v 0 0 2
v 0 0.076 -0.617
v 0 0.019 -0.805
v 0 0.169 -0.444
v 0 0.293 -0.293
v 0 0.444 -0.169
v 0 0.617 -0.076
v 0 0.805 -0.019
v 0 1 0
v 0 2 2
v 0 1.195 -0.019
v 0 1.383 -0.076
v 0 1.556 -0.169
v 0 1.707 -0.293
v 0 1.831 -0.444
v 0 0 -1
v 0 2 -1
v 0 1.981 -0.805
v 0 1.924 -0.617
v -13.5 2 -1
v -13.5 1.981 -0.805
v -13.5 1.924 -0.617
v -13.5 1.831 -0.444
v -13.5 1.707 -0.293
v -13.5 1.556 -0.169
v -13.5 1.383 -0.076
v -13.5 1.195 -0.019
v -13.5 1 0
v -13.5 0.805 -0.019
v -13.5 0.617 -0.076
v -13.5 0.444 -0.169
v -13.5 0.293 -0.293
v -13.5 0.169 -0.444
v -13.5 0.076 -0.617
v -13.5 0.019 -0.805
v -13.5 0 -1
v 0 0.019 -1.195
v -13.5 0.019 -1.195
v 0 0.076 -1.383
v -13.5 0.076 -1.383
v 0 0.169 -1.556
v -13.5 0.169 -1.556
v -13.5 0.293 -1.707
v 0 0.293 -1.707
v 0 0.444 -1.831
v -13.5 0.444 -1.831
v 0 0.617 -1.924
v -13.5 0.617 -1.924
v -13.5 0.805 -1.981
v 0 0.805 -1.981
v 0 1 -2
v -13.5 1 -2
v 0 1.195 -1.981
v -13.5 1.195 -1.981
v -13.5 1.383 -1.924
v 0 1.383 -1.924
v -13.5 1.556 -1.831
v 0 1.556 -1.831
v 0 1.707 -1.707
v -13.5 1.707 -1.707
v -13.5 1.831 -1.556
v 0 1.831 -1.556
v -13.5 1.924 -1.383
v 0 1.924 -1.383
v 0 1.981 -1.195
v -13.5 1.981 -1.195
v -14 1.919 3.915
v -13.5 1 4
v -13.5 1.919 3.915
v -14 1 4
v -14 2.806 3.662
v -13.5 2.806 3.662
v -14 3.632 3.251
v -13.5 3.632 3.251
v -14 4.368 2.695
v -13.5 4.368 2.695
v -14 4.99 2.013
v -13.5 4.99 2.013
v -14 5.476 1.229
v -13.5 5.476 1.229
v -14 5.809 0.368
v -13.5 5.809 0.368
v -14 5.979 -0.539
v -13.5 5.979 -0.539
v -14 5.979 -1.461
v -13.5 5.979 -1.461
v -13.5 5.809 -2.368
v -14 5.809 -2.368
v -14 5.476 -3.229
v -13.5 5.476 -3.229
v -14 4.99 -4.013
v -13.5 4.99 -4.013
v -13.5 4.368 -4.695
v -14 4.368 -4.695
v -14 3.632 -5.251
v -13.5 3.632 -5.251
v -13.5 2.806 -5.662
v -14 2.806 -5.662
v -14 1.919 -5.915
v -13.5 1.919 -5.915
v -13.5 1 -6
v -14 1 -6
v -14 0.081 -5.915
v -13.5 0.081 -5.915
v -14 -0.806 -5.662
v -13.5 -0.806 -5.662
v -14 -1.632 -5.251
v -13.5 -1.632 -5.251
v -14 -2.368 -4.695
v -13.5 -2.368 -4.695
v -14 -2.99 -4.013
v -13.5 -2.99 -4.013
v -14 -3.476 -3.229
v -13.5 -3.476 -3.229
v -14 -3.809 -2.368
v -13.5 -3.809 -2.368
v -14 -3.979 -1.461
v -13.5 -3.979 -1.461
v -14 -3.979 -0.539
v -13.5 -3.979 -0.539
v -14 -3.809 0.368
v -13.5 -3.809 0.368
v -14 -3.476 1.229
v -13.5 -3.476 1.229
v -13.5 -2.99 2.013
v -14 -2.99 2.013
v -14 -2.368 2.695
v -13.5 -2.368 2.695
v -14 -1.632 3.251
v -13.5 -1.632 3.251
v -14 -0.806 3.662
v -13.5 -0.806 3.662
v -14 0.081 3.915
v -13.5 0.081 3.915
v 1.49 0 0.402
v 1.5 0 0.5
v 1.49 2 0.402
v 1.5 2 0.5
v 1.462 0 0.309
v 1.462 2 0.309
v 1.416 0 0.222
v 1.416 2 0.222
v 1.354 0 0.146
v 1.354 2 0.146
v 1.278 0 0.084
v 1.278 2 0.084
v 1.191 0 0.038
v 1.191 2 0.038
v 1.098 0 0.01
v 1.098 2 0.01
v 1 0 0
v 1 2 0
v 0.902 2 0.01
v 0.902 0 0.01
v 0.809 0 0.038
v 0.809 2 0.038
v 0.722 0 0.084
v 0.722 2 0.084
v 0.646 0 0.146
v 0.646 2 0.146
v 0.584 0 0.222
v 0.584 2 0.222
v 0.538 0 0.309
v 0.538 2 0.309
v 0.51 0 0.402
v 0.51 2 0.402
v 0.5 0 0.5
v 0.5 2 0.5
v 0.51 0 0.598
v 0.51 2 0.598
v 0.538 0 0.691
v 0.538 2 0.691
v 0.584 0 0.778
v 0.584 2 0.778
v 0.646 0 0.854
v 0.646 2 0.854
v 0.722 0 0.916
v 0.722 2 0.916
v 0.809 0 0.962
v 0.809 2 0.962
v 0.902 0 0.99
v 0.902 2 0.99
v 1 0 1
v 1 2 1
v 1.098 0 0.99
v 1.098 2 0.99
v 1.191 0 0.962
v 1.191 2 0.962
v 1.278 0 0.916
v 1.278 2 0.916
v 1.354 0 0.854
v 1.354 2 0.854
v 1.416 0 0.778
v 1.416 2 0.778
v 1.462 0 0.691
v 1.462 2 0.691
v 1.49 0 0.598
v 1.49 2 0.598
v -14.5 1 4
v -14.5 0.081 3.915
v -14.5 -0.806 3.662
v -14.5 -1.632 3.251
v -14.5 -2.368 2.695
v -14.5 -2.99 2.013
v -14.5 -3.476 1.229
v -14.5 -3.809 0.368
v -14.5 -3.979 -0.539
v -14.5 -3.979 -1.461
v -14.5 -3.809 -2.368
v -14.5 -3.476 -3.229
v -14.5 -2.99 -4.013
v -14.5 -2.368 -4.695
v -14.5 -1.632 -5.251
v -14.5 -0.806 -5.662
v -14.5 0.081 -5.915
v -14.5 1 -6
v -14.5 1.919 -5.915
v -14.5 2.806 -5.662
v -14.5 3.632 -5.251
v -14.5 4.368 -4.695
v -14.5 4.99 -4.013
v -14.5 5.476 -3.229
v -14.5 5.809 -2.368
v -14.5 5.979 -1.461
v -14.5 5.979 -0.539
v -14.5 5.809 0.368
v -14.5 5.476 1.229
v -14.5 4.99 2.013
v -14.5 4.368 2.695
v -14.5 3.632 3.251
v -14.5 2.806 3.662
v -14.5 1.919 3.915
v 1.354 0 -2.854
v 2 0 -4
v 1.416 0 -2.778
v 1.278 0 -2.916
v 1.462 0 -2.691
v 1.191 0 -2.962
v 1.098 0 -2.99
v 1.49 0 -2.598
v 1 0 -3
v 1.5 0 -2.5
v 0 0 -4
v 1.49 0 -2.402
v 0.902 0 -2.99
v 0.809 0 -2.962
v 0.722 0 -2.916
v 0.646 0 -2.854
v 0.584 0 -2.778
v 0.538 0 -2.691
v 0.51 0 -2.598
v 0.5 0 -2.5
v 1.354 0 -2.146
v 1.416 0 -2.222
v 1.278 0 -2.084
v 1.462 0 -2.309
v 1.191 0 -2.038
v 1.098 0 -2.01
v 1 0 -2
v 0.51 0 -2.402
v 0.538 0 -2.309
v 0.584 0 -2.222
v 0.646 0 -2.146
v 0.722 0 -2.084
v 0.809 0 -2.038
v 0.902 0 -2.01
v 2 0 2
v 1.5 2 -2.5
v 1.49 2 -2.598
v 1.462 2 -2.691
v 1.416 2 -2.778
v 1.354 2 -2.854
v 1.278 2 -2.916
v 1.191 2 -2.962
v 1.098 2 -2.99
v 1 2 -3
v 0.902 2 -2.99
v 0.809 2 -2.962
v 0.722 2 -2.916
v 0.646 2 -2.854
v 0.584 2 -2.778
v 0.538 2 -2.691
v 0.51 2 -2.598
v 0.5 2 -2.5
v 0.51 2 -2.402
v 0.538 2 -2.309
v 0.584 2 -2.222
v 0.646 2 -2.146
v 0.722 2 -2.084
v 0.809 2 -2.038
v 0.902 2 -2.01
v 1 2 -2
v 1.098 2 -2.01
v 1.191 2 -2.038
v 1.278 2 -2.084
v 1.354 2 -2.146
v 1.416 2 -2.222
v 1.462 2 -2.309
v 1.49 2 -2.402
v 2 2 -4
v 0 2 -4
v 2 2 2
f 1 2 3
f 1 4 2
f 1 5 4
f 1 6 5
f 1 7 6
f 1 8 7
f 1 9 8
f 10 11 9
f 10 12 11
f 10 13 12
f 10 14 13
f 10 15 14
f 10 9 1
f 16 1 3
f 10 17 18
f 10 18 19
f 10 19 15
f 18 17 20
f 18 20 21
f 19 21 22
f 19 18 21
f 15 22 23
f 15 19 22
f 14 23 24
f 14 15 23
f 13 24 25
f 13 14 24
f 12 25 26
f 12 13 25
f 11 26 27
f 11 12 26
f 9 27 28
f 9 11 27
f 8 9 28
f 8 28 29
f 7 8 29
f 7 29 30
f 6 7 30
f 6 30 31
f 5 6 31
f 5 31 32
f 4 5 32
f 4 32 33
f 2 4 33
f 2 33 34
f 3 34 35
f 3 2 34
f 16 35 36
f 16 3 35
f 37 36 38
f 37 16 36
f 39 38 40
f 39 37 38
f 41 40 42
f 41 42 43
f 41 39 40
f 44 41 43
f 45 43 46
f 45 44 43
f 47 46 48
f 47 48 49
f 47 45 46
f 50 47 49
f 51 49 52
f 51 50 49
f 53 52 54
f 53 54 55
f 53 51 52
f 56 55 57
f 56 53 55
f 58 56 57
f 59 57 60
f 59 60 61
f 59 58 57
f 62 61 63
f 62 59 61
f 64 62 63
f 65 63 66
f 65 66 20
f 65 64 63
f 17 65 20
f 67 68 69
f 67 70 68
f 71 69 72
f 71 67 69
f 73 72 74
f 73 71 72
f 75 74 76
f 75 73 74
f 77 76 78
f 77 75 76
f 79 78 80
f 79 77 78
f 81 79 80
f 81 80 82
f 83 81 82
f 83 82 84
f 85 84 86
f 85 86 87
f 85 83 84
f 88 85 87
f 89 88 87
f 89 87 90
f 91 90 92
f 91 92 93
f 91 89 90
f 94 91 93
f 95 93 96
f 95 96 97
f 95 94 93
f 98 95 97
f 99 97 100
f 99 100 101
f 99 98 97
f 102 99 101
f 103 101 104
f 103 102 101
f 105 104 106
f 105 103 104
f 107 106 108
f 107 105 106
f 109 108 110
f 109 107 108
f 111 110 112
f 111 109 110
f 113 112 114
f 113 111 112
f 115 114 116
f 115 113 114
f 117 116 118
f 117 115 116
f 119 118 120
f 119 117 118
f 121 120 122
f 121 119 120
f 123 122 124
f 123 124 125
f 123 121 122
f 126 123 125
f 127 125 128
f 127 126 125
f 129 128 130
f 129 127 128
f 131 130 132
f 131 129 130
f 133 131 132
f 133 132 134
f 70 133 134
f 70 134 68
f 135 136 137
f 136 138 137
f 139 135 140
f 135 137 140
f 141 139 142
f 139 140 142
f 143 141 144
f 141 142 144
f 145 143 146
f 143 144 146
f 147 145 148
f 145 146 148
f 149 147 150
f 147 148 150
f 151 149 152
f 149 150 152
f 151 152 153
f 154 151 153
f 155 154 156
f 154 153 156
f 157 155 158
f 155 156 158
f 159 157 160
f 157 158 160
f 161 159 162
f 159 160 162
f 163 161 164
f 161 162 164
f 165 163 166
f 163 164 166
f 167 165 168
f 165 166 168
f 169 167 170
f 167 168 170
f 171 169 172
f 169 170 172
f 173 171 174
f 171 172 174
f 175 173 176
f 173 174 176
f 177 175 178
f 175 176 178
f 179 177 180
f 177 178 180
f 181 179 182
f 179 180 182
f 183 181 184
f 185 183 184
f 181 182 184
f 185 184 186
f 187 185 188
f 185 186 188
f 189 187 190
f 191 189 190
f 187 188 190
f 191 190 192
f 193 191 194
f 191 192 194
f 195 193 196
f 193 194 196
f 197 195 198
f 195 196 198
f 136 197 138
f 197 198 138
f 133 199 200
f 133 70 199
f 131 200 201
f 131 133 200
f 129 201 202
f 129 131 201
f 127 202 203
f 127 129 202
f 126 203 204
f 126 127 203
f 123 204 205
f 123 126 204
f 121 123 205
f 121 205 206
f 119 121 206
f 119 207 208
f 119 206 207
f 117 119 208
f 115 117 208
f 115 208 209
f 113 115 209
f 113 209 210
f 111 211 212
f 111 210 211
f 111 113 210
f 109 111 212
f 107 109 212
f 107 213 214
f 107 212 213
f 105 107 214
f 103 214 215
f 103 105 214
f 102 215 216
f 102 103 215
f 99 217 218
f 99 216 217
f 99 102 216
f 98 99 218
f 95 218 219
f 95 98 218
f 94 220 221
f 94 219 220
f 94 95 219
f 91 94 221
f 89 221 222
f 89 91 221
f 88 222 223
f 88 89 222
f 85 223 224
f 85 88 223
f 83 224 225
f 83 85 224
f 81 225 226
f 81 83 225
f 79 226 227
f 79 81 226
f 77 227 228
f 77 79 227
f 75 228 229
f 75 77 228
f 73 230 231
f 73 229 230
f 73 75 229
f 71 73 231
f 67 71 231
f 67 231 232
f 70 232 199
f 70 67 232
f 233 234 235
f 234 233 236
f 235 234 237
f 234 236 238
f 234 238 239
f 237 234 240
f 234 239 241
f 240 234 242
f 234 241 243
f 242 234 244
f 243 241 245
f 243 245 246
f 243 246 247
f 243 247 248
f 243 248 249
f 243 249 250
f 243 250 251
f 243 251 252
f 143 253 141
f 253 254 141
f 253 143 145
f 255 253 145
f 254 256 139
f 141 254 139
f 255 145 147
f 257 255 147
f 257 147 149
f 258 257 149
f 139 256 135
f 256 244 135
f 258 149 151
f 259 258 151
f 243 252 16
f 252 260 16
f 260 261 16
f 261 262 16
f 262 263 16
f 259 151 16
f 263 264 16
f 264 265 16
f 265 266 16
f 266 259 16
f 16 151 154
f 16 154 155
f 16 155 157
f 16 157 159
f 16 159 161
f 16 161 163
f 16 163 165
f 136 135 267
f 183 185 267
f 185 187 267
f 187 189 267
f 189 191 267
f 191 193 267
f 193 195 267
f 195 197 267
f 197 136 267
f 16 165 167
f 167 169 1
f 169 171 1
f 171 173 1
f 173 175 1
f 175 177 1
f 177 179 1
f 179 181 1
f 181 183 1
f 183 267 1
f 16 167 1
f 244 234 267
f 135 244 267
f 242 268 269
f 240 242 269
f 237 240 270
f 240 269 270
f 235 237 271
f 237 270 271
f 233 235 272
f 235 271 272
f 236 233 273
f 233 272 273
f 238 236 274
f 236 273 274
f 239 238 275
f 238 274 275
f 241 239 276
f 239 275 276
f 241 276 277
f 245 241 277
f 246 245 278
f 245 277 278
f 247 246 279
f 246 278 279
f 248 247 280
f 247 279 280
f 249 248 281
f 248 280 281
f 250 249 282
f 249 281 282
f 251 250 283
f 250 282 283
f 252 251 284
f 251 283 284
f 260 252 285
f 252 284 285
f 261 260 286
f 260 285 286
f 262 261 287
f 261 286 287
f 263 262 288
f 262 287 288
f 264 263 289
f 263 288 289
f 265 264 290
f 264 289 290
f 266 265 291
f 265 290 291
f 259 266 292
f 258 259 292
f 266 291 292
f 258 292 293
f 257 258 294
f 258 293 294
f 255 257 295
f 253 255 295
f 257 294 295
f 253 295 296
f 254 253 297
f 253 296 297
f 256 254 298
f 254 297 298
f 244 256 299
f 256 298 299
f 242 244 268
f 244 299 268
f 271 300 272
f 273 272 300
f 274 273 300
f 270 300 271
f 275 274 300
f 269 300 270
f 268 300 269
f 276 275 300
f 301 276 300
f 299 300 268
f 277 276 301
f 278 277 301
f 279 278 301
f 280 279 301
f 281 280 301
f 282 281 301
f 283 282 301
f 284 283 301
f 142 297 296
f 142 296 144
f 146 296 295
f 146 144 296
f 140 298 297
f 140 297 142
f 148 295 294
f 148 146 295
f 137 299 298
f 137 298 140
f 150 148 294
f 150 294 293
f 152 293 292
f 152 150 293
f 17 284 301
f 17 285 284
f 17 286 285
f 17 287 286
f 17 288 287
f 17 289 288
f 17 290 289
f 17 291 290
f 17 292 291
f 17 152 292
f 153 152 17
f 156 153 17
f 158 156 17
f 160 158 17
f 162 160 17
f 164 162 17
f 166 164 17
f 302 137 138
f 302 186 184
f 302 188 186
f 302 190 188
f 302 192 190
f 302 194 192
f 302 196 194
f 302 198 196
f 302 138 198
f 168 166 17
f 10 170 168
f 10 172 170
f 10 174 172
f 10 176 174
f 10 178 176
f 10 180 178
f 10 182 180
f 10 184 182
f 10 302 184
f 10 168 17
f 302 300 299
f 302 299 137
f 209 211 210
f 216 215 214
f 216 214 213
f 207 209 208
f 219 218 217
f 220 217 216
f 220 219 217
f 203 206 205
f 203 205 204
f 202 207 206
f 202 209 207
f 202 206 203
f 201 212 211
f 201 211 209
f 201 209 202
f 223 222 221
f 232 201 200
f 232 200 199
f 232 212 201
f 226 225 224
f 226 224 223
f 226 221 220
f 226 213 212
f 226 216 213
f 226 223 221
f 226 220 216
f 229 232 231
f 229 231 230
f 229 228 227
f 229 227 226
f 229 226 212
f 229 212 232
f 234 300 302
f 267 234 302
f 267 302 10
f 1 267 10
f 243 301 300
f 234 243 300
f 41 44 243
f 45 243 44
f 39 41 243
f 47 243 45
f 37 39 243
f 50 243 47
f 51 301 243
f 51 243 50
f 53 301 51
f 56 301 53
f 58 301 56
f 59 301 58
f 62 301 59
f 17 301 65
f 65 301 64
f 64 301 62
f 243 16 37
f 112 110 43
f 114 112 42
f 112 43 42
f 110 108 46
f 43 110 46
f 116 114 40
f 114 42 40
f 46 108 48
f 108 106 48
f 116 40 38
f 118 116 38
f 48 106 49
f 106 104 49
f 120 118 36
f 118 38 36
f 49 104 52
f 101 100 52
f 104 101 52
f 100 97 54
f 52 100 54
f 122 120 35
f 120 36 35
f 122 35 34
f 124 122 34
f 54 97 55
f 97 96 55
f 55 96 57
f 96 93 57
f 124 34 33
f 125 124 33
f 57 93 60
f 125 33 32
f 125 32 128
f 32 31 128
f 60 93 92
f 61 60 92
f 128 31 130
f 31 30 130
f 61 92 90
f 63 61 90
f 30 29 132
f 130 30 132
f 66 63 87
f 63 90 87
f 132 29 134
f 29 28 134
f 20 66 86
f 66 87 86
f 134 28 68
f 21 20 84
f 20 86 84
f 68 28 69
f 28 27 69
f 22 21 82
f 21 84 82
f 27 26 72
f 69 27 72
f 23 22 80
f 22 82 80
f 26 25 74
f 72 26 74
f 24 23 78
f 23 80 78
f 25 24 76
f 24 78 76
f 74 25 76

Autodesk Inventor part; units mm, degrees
ref_plane "YZ Plane" through (0, 0, 0) normal (1, 0, 0) x (0, 1, 0)
ref_plane "XZ Plane" through (0, 0, 0) normal (0, 1, 0) x (-1, 0, 0)
ref_plane "XY Plane" through (0, 0, 0) normal (0, 0, 1) x (1, 0, 0)
sketch "Sketch1" plane through (0, 0, 0) normal (0, 1, 0) x (-1, 0, 0)
  line L0 (0, 0) -> (20, 0)
  line L1 (20, 0) -> (20, -2)
  line L2 (20, -2) -> (0, -2)
  line L3 (0, -2) -> (0, 0)
  dimension "d0" = 20
  dimension "d1" = 2
extrude "Extrusion1" add sketch "Sketch1" along normal blind 2
sketch "Sketch2" plane through (0, 2, 0) normal (0, 1, 0) x (1, 0, 0)
  line L0 (0, 2) -> (-20, 2) projected
  line L1 (0, 2) -> (0, 4)
  line L2 (0, 4) -> (2, 4)
  line L3 (2, 4) -> (2, -2)
  line L4 (2, -2) -> (0, -2)
  line L5 (0, 0) -> (0, 2) projected
  line L6 (0, -2) -> (0, 0)
  dimension "d4" = 2
  dimension "d5" = 2
  dimension "d6" = 6
extrude "Extrusion2" add sketch "Sketch2" against normal blind 2
sketch "Sketch3" plane through (0, 2, 0) normal (0, 1, 0) x (1, 0, 0)
  line L0 (0, 0) -> (0, -2) projected
  line L1 (0, -2) -> (0, -1)
  line L2 (2, 4) -> (2, -2) projected
  line L3 (2, -2) -> (2, -0.5)
  line L4 (2, -0.5) -> (1, -0.5)
  circle A0 centre (1, -0.5) radius 0.5
  line L5 (2, 1) -> (1.5, 1)
  circle A1 centre (1, 2.5) radius 0.5
  dimension "d9" = 1.5
  dimension "d10" = 1
  dimension "d11" = 1
extrude "Extrusion3" cut sketch "Sketch3" against normal blind 2
sketch "Sketch4" plane through (0, 2, -4) normal (-1, 0, 0) x (0, 0, 1)
  line L0 (2, 0) -> (4, 0) projected
  line L1 (3, 0) -> (3, -2)
  line L2 (2, -2) -> (4, -2) projected
  circle A0 centre (3, -1) radius 1
  line L3 (2, -2) -> (2, 0) projected
  circle A1 centre (3, -1) radius 1.4142
extrude "Extrusion4" cut sketch "Sketch4" along normal blind 100 contours L0 A0 L3 | L3 A1 | L0 A1 L2 A0 | A0 L2 L3
ref_plane "Work Plane1" through (-14, 1, -1) normal (-1, 0, 0) x (0, 0, 1)
sketch "Sketch5" plane through (-14, 1, -1) normal (-1, 0, 0) x (0, 0, 1)
  circle A0 centre (0, 0) radius 5
  point P0 (1, -1)
  dimension "d17" = 10
extrude "Extrusion5" add sketch "Sketch5" along normal mid plane 1
sketch "Sketch6" plane through (-20, 1, -1) normal (-1, 0, 0) x (0, 0, 1)
  circle A0 centre (0, 0) radius 5
  point P0 (1, -1)
extrude "Extrusion6" cut sketch "Sketch6" against normal blind 5.5
properties part number "drive_shaft"
